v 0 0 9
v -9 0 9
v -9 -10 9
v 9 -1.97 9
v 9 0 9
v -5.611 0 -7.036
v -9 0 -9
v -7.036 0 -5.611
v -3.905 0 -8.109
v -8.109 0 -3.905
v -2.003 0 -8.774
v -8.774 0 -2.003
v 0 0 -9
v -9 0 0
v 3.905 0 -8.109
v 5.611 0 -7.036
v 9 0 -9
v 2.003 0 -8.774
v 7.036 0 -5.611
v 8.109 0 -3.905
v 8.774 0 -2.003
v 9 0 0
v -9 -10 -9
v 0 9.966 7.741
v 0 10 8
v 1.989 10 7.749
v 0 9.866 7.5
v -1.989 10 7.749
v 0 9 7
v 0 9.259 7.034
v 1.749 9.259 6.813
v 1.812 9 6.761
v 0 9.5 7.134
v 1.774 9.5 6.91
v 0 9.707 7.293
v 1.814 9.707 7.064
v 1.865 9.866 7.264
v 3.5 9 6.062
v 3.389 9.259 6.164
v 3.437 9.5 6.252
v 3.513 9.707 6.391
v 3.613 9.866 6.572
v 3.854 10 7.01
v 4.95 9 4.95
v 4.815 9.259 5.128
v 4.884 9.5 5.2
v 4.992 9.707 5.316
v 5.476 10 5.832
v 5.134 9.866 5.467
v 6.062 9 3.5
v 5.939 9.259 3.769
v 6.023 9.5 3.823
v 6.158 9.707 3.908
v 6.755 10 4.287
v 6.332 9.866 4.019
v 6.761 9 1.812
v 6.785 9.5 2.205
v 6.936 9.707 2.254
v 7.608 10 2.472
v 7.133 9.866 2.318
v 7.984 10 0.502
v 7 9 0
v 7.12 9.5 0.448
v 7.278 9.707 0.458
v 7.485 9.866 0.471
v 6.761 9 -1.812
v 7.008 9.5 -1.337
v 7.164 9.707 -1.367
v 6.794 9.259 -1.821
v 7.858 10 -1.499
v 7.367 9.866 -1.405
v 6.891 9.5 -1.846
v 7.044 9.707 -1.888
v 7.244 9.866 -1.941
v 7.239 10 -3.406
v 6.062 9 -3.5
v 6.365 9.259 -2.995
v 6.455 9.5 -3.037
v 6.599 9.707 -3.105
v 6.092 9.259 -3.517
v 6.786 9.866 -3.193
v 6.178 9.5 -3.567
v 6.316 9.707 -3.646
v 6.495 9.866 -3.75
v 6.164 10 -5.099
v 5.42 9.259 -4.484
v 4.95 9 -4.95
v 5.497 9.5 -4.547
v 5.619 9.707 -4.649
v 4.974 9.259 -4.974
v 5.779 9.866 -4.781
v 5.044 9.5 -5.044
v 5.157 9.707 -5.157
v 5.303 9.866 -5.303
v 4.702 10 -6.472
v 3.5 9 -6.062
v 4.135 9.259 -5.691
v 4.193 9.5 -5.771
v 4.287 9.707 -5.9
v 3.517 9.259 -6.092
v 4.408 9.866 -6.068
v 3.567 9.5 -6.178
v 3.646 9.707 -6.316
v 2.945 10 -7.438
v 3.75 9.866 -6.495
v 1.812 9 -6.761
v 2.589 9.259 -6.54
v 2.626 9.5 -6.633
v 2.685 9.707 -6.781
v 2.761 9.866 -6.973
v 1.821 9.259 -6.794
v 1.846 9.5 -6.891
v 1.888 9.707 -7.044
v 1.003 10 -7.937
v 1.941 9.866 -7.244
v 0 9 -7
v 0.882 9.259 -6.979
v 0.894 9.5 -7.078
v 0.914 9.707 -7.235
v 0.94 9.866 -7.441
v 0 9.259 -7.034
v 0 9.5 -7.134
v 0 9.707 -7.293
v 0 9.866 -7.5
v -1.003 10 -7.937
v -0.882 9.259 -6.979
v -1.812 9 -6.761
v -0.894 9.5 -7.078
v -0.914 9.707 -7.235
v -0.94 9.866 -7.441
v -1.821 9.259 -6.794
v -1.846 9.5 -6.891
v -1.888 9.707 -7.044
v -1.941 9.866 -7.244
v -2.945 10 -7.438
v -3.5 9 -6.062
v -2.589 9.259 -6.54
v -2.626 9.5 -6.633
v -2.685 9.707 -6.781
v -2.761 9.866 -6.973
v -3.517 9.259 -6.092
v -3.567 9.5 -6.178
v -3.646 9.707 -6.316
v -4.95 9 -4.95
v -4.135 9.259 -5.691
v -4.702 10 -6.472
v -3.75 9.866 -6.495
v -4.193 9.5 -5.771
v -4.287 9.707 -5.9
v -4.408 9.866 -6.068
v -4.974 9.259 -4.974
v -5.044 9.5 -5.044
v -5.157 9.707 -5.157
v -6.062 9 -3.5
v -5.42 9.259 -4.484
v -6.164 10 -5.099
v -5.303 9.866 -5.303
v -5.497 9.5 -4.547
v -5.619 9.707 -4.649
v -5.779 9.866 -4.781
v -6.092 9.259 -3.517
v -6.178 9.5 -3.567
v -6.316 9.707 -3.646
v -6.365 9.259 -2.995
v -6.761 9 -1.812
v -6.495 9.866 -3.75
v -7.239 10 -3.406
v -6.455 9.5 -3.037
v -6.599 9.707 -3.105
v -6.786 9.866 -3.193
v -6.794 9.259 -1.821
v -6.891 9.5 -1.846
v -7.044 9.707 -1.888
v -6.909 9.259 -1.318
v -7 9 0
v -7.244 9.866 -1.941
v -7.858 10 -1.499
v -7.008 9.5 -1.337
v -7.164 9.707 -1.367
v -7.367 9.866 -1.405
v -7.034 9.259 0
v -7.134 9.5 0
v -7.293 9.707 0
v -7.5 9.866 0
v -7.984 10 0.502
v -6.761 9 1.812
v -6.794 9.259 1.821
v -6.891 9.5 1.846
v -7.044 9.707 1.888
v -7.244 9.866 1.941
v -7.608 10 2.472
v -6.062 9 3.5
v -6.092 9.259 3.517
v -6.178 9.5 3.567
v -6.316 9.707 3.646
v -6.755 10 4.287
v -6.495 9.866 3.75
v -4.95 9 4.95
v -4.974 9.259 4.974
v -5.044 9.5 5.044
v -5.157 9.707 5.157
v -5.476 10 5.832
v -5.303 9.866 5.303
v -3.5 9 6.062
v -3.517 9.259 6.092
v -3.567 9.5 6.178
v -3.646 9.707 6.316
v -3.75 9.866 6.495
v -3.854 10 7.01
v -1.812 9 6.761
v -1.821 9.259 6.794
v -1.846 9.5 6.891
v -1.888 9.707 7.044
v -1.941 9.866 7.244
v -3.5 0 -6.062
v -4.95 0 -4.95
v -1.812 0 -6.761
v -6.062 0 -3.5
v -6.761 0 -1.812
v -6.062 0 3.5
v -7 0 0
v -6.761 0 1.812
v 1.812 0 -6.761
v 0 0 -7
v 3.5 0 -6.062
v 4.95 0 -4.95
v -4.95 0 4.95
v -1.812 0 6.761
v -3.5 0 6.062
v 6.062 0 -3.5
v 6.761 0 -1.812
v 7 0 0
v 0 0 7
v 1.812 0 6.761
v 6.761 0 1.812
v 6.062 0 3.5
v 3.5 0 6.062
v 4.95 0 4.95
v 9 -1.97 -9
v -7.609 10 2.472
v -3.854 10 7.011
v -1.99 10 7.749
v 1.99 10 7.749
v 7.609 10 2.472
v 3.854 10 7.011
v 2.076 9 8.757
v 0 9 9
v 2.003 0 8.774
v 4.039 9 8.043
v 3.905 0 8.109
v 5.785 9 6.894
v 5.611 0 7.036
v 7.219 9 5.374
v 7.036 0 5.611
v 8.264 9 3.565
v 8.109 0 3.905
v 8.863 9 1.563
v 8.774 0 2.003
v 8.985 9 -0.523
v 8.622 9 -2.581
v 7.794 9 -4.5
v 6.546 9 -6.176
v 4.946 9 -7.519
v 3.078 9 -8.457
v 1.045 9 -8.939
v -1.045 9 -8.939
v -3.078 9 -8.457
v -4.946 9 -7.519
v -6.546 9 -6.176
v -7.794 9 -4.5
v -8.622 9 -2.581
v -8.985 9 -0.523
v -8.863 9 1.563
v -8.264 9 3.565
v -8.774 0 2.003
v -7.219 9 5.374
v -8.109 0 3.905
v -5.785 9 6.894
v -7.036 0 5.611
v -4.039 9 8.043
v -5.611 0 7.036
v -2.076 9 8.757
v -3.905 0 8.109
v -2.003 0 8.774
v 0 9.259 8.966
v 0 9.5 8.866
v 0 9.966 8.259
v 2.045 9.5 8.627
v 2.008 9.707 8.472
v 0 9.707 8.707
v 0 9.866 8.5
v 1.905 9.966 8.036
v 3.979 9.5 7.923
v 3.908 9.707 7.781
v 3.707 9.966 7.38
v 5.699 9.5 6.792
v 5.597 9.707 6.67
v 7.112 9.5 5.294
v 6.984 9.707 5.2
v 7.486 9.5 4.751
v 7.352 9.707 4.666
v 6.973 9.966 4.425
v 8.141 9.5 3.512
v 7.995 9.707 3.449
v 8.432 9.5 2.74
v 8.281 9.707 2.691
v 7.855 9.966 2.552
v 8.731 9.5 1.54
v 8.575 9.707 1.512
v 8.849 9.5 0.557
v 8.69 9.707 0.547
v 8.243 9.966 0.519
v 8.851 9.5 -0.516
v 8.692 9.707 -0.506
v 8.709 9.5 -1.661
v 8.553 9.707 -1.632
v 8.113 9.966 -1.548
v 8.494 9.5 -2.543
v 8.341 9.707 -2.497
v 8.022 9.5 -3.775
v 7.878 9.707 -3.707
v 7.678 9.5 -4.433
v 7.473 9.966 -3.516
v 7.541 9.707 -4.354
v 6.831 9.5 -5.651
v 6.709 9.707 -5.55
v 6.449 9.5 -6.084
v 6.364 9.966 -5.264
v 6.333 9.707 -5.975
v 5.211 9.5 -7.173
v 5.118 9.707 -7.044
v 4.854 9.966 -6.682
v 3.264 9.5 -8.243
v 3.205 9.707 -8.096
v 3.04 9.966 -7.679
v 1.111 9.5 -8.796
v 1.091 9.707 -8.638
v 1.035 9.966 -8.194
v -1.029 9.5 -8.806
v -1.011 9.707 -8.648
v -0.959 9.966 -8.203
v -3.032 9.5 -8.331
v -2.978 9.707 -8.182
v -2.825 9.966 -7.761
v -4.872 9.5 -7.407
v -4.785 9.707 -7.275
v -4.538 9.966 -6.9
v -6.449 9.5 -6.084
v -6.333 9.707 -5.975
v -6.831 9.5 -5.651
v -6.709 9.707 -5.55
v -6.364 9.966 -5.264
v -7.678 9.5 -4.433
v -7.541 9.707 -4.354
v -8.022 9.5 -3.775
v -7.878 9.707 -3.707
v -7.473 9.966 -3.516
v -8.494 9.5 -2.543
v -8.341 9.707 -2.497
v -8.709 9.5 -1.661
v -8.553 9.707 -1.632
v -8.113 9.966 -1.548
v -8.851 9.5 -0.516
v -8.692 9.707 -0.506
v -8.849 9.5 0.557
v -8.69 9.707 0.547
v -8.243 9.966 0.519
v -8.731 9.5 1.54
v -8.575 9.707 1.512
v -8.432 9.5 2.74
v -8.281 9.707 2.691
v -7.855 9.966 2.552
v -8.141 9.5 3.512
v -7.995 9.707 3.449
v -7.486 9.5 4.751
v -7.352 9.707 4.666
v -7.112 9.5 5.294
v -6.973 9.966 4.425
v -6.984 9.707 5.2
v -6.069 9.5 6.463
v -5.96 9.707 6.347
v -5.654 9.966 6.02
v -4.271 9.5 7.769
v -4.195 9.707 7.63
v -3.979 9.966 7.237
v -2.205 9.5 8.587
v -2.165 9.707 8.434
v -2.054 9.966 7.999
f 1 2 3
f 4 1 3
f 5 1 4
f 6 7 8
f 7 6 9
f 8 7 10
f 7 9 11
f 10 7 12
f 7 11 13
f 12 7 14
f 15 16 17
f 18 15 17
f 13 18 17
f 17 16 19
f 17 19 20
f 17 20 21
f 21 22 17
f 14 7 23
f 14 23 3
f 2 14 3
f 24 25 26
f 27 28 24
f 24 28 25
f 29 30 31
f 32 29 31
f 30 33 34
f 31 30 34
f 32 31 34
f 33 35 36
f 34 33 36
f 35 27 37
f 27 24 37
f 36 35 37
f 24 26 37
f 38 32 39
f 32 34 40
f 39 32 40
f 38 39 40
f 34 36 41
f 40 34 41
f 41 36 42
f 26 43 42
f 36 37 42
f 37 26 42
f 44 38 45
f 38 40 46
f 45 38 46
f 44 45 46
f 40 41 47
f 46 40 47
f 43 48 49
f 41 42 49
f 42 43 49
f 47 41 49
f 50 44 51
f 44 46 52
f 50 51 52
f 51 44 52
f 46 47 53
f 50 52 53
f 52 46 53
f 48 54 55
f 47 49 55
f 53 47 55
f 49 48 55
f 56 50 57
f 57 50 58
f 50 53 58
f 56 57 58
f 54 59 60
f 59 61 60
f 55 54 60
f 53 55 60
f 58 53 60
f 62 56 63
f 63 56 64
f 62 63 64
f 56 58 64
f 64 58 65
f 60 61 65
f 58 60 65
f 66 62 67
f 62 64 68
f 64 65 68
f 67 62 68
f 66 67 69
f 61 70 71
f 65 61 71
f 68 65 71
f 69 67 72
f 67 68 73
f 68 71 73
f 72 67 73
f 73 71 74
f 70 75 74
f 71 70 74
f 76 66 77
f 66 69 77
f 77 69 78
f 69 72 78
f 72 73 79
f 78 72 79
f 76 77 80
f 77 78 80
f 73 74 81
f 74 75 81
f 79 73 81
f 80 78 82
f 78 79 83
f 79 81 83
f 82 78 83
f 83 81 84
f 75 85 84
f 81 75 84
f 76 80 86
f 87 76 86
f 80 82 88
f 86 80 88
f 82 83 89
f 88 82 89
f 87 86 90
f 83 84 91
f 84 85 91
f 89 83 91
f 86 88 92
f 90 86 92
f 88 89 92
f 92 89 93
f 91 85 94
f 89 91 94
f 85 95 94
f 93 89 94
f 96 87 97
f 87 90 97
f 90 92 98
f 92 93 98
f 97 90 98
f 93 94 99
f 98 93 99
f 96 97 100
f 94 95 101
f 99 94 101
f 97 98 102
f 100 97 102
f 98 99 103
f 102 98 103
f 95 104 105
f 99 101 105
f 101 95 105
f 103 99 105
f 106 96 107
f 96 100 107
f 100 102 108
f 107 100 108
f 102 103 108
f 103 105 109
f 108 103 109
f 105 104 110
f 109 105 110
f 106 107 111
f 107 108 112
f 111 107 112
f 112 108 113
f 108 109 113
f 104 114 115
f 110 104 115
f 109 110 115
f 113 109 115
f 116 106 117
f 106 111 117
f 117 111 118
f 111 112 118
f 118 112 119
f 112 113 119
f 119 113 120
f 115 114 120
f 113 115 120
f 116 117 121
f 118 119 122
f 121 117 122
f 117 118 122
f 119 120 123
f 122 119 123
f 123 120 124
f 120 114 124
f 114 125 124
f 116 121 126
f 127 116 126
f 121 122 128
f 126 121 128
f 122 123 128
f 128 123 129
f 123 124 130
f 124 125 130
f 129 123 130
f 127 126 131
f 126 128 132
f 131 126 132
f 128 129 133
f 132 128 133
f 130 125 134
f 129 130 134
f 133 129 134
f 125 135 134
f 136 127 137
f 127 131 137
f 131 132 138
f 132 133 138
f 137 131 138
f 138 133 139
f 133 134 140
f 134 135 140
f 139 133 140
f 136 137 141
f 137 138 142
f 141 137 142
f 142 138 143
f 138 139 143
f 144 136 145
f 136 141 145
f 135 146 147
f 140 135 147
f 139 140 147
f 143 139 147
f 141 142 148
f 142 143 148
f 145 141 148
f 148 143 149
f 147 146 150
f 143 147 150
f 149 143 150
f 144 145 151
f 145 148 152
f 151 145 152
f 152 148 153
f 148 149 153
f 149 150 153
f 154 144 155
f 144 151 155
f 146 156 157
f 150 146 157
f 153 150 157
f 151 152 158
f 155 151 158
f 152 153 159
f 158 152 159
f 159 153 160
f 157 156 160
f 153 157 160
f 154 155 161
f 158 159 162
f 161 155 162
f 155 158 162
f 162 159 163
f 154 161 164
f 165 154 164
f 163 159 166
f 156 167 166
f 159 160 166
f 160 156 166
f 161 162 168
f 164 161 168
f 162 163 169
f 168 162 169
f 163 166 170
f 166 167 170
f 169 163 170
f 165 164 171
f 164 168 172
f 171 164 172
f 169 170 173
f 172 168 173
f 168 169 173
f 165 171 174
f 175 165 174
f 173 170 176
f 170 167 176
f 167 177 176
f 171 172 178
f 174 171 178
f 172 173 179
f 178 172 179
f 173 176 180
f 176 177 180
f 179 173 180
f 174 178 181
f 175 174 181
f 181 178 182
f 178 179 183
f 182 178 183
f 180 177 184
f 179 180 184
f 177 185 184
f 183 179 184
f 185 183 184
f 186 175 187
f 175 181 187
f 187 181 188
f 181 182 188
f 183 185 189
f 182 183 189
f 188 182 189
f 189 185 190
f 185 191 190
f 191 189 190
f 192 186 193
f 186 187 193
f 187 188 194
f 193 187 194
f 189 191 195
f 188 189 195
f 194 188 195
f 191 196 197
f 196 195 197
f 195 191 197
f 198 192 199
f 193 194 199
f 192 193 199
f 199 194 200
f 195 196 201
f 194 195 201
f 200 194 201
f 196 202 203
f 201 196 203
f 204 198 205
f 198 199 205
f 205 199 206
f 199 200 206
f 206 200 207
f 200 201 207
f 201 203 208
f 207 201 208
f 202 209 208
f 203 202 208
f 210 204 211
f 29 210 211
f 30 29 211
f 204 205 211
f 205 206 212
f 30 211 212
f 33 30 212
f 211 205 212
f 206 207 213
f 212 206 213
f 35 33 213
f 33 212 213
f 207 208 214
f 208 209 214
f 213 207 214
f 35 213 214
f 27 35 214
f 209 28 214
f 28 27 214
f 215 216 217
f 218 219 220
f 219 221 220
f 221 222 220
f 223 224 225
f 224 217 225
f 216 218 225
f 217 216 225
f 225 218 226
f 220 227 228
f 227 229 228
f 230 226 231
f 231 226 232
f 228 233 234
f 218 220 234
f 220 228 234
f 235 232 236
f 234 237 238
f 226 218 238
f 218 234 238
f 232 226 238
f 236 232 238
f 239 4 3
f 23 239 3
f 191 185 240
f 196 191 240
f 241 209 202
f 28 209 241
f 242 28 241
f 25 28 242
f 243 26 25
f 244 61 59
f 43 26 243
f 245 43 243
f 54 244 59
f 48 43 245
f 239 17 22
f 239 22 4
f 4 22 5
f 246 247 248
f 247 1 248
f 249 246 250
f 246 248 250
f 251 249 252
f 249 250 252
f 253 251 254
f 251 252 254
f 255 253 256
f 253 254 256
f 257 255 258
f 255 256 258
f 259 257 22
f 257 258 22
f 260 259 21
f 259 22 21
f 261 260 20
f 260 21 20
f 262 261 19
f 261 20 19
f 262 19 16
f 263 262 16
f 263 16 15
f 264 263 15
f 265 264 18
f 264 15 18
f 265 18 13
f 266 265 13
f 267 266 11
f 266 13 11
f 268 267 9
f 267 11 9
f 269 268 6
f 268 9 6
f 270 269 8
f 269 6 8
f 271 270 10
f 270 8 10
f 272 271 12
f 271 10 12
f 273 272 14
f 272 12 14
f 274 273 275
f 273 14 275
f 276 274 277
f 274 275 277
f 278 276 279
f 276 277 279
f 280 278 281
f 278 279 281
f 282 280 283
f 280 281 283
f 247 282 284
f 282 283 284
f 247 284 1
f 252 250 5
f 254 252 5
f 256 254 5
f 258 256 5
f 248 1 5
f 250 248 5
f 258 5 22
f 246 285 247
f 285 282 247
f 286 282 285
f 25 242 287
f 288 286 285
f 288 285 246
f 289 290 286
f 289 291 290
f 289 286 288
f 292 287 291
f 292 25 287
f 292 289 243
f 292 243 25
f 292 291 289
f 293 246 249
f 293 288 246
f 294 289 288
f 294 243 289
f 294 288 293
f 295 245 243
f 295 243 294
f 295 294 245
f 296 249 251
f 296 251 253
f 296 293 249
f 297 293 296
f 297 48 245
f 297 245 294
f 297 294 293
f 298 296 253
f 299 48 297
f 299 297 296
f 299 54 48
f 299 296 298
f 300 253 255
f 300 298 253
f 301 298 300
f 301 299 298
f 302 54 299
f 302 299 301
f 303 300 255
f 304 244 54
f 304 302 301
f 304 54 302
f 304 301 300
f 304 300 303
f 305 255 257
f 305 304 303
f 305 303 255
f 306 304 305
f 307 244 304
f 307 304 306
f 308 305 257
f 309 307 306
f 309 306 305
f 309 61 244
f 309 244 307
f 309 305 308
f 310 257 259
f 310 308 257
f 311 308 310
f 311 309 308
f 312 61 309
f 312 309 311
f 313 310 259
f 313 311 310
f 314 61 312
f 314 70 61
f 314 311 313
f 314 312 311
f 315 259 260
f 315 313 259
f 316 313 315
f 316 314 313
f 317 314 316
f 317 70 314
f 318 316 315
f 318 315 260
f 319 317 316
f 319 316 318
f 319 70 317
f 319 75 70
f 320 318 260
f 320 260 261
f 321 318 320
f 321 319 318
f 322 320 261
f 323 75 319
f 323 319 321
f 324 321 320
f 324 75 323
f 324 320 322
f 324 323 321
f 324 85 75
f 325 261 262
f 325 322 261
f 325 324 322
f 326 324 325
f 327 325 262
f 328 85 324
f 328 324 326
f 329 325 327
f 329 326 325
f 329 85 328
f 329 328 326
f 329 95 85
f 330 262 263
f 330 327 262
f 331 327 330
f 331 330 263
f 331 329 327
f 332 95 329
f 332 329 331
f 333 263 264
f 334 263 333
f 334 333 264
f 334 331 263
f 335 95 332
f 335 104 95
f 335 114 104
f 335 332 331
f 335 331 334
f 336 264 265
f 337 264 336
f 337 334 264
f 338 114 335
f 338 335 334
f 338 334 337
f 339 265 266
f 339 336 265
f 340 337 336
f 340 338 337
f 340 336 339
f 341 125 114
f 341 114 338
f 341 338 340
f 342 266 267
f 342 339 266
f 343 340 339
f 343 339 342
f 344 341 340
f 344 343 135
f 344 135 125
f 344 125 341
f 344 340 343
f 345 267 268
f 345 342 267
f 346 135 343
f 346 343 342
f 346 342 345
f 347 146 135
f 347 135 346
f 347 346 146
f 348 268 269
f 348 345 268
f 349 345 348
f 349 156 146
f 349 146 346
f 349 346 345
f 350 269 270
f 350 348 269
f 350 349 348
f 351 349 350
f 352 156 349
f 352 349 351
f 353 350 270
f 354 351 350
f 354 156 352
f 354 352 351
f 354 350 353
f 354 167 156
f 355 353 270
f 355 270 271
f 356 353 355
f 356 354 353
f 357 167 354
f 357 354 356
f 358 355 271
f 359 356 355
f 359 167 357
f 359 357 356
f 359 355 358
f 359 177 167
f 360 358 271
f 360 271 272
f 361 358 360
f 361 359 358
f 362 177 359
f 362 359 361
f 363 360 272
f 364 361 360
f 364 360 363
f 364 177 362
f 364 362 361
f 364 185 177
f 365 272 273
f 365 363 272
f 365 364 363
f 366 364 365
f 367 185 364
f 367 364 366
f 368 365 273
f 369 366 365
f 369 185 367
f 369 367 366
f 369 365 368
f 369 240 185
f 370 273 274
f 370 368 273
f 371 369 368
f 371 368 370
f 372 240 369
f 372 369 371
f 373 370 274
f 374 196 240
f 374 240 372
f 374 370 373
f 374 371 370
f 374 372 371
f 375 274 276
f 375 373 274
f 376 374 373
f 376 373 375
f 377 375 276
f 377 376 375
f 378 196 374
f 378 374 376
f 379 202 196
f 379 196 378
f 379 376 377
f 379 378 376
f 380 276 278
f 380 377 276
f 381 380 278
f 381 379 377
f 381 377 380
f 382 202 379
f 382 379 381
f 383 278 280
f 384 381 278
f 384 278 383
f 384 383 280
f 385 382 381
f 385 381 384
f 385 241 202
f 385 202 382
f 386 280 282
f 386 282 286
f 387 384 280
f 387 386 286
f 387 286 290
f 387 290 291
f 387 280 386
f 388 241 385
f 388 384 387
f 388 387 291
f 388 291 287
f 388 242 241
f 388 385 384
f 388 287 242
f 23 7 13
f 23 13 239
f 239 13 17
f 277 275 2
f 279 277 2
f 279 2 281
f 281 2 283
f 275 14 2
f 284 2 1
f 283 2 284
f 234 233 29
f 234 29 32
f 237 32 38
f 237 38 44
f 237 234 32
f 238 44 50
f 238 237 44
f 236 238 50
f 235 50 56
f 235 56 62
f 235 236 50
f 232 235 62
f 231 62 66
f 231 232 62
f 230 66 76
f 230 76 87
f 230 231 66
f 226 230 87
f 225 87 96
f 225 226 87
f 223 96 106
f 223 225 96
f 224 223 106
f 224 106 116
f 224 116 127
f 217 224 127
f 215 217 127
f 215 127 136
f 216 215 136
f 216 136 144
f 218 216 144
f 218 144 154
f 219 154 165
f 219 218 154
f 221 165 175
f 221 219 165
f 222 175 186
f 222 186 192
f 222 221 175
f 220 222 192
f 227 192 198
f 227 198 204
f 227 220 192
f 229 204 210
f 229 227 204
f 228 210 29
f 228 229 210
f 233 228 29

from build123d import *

# Parameters (mm, degrees)
SKETCH1_R           = 9
SKETCH1_R_2         = 7
BOSS_EXTRUDE1_DEPTH = 10
FILLET1_R           = 1
SKETCH2_W           = 18
SKETCH2_H           = 18
BOSS_EXTRUDE2_DEPTH = 10
CUT_EXTRUDE1_DEPTH  = 23.472205054


with BuildPart() as part:
    # Sketch1 → Boss-Extrude1 (new body)
    with BuildSketch(Plane(origin=(0, 0, 0), x_dir=(1, 0, 0), z_dir=(0, 1, 0))):
        with Locations(Location((0, 0, 0), (0, 0, 270))):
            Circle(SKETCH1_R)
        with Locations(Location((0, 0, 0), (0, 0, 270))):
            Circle(SKETCH1_R_2, mode=Mode.SUBTRACT)
    extrude(amount=BOSS_EXTRUDE1_DEPTH)

    # Fillet1
    fillet1_edges = [part.edges().sort_by_distance(p)[0] for p in [
        (0, 10, -9),
        (0, 10, -7),
    ]]
    fillet(fillet1_edges, radius=FILLET1_R - 0.0001)  # a hair under: the kernel refuses the full size

    # Sketch2 → Boss-Extrude2 (add)
    with BuildSketch(Plane.XZ):
        Rectangle(SKETCH2_W, SKETCH2_H)
    extrude(amount=BOSS_EXTRUDE2_DEPTH)

    # Sketch4 → Cut-Extrude1 (cut, through all)
    with BuildSketch(Plane.XY.offset(9)):
        Polygon((-9, -10), (9, -10), (9, -1.969771915), align=None)
    extrude(amount=-CUT_EXTRUDE1_DEPTH, mode=Mode.SUBTRACT)


solid = part.part
